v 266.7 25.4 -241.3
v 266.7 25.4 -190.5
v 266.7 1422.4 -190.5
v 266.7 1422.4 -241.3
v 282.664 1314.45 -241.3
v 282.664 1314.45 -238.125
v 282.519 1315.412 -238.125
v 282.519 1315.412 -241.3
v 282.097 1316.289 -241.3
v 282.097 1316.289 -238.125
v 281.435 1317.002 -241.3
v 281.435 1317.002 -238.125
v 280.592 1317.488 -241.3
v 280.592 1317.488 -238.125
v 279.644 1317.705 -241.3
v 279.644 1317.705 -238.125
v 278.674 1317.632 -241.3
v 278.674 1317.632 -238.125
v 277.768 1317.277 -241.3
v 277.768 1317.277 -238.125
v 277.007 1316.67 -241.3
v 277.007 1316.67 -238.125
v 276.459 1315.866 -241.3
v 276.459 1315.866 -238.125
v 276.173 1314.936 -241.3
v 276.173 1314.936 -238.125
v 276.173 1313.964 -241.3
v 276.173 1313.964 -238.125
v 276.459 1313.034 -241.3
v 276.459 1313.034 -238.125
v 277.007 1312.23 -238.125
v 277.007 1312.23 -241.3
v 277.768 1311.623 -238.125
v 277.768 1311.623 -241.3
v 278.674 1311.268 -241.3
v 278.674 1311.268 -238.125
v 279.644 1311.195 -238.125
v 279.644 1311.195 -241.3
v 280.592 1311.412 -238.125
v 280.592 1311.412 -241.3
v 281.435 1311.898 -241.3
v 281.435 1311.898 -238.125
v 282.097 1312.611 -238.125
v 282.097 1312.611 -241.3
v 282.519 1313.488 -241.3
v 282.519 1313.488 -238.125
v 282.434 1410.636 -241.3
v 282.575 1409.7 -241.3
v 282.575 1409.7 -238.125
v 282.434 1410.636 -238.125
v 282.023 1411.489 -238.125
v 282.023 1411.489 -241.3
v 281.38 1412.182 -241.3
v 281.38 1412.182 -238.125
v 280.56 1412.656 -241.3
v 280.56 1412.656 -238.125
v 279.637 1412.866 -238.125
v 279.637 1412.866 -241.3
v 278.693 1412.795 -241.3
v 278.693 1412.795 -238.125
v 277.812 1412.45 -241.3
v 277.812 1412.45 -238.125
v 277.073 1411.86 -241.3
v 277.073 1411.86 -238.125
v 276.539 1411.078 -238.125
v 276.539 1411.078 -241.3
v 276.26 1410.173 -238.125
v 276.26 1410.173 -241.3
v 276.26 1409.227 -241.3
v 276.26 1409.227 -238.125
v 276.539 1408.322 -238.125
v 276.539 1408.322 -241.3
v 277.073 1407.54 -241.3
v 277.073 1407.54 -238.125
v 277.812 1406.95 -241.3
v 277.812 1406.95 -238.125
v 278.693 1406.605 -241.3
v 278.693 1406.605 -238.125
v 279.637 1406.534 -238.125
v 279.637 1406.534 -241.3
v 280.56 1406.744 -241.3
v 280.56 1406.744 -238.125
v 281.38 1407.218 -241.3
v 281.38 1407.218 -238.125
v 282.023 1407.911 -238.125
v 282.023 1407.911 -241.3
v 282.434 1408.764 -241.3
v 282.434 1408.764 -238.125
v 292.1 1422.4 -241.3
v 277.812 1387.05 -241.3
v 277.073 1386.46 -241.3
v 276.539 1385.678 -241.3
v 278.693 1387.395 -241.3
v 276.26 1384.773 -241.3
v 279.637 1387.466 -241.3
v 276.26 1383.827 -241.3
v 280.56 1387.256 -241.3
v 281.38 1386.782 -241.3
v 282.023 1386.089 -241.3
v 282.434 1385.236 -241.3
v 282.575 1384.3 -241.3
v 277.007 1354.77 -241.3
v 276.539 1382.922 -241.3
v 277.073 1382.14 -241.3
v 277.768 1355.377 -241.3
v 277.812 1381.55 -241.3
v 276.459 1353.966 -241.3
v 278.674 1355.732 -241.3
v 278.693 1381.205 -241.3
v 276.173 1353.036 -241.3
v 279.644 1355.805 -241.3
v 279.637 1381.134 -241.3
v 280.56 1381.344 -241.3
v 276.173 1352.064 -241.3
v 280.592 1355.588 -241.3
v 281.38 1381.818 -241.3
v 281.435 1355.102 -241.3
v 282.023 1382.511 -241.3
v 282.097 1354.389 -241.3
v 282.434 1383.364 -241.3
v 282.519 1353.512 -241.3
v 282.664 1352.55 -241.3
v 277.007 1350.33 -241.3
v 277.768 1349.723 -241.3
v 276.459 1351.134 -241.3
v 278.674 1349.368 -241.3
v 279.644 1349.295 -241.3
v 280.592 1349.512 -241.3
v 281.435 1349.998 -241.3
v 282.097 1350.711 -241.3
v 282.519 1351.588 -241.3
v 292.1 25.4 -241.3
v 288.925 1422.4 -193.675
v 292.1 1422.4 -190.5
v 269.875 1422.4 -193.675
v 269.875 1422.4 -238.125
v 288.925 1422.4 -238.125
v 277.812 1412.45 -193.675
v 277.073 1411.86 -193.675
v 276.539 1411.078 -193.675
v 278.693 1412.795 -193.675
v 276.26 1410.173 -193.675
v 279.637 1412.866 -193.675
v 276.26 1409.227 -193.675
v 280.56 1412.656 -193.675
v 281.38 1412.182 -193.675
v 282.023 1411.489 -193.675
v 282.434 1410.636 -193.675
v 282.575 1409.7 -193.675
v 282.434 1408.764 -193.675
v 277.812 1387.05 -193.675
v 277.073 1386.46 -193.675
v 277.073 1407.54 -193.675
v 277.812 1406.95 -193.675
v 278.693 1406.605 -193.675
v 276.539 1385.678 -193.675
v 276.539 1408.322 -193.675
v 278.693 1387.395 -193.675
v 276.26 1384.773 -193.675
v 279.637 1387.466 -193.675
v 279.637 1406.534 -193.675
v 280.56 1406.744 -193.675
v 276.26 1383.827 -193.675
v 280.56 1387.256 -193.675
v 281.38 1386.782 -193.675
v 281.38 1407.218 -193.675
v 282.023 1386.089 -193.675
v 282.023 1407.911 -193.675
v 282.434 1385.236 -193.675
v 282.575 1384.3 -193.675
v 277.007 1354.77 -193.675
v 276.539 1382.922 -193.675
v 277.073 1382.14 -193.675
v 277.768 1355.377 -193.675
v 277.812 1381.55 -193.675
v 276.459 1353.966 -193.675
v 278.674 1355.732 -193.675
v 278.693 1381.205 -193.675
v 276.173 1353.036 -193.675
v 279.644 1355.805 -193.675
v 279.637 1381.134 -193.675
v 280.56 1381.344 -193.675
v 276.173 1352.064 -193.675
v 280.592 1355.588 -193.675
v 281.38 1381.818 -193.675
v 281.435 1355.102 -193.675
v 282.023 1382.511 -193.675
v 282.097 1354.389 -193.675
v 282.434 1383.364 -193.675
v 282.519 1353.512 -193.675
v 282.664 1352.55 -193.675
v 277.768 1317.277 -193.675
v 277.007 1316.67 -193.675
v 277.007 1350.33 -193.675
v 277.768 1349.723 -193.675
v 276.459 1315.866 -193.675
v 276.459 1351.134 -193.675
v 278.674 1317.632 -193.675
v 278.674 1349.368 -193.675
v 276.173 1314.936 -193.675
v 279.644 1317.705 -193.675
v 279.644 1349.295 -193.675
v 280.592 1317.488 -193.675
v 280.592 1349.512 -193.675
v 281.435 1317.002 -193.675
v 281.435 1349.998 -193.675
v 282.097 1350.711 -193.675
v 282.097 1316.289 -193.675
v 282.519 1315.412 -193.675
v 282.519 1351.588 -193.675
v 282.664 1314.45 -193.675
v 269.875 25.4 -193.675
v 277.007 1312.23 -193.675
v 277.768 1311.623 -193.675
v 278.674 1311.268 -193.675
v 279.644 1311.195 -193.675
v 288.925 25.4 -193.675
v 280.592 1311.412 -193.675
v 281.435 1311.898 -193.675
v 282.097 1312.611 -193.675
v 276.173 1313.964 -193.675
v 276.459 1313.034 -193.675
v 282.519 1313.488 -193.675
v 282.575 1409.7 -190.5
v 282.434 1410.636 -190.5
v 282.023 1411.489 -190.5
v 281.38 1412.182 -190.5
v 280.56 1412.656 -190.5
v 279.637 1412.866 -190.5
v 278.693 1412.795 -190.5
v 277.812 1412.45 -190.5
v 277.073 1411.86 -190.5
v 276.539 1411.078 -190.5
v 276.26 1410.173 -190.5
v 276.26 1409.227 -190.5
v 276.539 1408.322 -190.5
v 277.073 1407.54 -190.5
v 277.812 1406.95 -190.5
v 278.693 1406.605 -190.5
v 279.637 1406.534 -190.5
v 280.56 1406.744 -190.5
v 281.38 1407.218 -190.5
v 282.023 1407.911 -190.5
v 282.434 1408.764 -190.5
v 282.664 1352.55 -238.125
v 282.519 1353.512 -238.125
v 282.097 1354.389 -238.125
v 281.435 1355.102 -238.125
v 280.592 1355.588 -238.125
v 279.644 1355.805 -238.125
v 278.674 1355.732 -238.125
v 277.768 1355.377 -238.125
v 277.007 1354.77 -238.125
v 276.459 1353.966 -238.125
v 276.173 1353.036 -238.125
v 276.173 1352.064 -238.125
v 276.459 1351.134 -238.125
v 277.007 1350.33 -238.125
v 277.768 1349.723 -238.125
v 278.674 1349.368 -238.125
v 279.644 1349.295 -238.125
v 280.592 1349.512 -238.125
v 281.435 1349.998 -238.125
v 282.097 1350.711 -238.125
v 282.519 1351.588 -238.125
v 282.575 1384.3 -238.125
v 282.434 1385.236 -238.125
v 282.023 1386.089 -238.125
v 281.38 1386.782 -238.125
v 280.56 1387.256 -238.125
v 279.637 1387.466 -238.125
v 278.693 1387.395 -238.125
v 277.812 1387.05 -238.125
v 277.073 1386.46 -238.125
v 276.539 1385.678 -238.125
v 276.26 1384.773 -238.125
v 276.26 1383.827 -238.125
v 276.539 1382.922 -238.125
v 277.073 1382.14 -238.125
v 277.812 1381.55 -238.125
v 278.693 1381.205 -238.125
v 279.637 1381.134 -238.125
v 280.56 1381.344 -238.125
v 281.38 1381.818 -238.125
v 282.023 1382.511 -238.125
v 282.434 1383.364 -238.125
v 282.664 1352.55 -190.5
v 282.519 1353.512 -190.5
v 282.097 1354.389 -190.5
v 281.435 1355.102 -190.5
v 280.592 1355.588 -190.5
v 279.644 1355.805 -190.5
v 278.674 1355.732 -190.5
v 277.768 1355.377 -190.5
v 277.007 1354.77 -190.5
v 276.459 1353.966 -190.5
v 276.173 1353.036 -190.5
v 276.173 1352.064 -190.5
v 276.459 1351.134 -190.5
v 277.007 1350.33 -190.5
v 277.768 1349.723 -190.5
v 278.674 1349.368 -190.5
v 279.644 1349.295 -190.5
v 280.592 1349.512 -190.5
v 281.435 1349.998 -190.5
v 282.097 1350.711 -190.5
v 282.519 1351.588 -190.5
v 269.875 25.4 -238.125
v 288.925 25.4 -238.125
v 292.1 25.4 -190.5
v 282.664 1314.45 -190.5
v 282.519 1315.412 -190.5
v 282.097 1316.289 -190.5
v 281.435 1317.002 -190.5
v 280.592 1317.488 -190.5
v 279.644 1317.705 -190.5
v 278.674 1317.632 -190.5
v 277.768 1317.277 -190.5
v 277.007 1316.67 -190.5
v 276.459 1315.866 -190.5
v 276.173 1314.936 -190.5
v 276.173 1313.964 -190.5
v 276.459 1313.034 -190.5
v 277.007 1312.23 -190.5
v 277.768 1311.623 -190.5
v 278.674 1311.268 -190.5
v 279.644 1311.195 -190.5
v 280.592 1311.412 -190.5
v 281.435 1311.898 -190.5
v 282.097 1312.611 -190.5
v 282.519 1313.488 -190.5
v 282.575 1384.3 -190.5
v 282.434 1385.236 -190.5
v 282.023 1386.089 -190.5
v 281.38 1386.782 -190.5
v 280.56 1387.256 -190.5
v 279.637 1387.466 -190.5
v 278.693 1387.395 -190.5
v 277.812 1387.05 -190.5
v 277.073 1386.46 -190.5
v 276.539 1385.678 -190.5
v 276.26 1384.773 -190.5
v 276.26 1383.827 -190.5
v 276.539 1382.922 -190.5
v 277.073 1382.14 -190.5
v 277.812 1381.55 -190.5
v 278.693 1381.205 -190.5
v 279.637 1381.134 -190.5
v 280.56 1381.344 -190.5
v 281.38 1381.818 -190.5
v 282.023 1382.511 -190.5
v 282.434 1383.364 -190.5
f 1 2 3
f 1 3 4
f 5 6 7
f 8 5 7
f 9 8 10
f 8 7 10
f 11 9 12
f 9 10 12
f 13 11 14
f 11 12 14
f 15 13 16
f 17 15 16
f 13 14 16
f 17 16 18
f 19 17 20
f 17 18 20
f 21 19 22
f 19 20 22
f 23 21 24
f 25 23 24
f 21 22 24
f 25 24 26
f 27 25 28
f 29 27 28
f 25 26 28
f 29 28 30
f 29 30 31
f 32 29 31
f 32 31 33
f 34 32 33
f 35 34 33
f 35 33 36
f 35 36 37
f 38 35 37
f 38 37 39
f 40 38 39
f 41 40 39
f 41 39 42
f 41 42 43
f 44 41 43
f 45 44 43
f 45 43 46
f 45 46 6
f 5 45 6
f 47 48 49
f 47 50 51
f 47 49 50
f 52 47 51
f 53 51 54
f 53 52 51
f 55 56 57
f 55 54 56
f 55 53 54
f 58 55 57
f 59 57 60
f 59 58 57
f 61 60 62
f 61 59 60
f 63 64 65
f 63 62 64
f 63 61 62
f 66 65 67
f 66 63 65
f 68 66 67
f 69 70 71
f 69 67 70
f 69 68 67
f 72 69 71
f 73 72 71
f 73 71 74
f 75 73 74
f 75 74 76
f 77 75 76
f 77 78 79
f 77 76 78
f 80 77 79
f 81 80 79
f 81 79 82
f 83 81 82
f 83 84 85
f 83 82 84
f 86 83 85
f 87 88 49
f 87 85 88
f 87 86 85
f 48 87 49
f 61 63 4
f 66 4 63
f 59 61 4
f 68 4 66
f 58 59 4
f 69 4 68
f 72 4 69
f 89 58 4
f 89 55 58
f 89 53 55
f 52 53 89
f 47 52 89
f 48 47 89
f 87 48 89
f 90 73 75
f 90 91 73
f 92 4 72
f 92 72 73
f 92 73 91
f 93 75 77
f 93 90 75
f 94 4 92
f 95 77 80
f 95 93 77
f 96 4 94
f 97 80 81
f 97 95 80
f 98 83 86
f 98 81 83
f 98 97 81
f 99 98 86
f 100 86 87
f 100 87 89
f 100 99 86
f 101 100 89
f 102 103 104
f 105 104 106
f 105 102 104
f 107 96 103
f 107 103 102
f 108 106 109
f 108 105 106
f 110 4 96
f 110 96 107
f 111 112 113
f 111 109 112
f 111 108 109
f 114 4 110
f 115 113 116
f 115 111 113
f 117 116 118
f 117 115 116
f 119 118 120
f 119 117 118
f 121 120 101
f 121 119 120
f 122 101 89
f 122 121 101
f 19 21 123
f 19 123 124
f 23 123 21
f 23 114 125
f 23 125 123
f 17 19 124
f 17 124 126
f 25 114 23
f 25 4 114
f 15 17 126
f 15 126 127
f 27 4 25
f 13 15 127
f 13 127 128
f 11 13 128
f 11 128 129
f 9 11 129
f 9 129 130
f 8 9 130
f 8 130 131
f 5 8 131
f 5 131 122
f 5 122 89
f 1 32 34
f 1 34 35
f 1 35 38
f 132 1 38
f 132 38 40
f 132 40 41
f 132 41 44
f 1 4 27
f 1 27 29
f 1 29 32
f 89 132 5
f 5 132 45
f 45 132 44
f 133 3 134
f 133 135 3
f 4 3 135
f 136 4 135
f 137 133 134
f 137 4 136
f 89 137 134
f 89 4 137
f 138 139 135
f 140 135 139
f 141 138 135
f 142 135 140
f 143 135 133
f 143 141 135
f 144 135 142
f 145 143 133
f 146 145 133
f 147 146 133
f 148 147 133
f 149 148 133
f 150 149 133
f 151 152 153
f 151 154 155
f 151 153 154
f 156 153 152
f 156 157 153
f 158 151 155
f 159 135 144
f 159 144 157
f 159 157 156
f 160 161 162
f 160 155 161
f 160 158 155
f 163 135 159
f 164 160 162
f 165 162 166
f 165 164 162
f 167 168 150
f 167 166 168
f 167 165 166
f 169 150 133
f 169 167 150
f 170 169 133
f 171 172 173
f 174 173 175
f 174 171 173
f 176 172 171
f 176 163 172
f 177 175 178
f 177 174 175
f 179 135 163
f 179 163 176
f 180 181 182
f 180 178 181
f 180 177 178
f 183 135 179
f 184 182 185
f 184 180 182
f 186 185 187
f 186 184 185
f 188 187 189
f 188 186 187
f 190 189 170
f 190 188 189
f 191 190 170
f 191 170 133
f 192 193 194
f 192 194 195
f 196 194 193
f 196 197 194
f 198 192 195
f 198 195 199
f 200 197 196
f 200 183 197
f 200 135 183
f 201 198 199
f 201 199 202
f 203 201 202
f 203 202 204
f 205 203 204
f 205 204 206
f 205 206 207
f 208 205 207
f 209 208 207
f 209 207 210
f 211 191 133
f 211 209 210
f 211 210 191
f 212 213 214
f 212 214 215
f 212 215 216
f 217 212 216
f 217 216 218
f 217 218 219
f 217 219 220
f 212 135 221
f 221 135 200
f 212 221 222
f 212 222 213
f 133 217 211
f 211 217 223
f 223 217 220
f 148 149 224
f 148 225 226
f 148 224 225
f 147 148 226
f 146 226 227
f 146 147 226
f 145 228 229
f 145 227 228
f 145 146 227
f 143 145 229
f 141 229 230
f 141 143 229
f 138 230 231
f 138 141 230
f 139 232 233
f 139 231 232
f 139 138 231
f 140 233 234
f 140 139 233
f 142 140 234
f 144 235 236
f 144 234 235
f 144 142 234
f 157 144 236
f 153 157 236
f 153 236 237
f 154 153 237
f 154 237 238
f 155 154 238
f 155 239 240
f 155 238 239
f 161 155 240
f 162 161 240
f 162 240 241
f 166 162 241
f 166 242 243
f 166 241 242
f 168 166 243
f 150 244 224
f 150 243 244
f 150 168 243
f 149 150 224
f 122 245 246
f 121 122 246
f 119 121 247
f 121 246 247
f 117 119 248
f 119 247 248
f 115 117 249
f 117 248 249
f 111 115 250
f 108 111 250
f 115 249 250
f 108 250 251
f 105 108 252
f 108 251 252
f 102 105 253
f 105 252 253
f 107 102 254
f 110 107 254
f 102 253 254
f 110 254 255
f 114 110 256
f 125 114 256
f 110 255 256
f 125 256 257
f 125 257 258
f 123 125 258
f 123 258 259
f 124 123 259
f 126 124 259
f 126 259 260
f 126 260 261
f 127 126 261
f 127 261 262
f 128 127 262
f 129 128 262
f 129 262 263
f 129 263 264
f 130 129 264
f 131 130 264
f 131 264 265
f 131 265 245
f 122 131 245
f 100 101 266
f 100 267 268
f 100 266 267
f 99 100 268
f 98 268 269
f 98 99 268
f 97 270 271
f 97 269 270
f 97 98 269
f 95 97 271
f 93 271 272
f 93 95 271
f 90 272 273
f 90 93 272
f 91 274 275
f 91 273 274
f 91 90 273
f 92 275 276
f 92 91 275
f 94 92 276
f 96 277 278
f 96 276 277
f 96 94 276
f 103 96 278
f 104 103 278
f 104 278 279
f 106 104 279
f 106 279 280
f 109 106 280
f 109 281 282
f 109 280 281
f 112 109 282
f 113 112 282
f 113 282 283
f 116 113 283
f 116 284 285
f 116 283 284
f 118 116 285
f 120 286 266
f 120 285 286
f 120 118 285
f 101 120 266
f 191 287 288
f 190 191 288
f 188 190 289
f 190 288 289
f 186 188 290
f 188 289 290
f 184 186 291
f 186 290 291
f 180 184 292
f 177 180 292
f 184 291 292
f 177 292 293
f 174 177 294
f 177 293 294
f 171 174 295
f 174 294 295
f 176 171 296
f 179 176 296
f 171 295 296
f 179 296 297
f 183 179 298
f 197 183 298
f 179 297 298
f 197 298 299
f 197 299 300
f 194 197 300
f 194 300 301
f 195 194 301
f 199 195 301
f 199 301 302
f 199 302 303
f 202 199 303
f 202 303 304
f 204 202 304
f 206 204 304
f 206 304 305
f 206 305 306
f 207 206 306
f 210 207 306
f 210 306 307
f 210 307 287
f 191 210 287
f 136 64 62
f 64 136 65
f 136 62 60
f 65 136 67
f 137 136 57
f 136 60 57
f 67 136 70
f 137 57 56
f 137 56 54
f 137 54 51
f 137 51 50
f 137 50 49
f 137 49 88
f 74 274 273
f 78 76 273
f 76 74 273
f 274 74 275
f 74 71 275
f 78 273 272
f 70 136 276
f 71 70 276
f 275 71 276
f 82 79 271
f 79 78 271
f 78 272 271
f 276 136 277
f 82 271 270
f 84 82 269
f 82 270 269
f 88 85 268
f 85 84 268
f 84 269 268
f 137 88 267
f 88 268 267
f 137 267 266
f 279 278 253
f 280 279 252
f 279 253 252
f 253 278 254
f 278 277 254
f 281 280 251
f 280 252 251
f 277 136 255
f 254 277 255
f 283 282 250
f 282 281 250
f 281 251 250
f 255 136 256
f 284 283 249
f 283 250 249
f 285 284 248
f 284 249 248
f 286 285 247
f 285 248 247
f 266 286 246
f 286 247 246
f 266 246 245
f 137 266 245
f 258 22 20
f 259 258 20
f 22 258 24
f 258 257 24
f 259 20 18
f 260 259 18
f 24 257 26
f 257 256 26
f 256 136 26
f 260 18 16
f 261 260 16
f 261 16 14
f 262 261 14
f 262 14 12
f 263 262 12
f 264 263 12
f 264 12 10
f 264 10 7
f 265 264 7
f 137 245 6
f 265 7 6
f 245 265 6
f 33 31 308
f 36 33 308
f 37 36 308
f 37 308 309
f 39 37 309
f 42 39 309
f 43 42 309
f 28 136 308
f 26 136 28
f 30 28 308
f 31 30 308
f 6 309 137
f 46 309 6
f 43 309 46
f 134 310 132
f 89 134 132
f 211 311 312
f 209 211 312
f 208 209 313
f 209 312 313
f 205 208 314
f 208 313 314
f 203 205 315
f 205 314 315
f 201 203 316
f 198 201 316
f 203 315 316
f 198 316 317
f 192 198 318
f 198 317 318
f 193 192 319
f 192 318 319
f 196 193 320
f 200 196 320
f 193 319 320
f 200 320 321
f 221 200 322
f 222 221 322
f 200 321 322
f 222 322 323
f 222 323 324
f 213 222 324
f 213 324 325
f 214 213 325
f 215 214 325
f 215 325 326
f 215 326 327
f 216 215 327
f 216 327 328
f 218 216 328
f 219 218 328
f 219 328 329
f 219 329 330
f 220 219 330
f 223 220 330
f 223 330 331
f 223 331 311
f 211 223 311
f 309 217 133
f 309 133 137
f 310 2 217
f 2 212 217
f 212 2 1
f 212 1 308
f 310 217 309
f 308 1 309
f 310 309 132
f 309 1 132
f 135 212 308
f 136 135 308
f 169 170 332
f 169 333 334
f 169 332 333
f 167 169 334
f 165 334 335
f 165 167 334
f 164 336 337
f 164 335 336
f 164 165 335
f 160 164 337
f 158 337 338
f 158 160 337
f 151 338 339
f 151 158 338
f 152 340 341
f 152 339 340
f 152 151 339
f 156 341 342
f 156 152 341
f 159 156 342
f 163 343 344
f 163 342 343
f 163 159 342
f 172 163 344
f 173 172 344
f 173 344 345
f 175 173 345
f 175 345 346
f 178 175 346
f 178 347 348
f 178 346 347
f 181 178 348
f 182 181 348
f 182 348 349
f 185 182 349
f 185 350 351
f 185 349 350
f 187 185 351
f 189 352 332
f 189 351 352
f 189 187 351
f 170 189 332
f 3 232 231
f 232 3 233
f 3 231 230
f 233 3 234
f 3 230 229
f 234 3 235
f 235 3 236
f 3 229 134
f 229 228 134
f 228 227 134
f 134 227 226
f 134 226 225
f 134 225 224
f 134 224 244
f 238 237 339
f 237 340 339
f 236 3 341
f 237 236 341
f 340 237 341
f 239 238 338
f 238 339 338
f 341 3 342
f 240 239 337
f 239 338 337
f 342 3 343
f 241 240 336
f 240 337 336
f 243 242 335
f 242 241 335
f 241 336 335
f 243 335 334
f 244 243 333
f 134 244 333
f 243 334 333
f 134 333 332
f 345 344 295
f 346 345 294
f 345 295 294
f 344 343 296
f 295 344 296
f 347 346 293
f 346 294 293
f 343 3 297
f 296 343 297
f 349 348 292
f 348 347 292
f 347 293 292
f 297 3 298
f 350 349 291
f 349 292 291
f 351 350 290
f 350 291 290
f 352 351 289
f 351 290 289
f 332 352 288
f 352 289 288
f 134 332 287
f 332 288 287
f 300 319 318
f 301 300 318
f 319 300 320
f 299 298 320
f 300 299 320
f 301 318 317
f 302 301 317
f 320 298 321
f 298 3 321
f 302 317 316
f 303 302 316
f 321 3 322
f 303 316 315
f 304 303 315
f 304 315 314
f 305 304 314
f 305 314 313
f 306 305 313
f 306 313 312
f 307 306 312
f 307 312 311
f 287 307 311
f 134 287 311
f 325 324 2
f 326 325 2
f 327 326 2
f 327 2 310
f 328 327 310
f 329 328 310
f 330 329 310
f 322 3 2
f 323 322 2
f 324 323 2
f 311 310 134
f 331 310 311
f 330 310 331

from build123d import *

# Parameters (mm, degrees)
SKETCH1_W               = 25.4
SKETCH1_H               = 50.8
SKETCH1_W_2             = 19.05
SKETCH1_H_2             = 44.45
BOSS_EXTRUDE1_DEPTH     = 1397
SKETCH2_R               = 3.2639
CUT_EXTRUDE1_DEPTH      = 1472.995197003
CUT_EXTRUDE2_DEPTH      = 1472.995197003
CUT_EXTRUDE2_DEPTH_BACK = 1472.995197003
SKETCH3_R               = 3.175


with BuildPart() as part:
    # Sketch1 → Boss-Extrude1 (new body)
    with BuildSketch(Plane(origin=(0, 25.4, 0), x_dir=(1, 0, 0), z_dir=(0, 1, 0))):
        with Locations((279.4, 215.9)):
            Rectangle(SKETCH1_W, SKETCH1_H)
        with Locations((279.4, 215.9)):
            Rectangle(SKETCH1_W_2, SKETCH1_H_2, mode=Mode.SUBTRACT)
    extrude(amount=BOSS_EXTRUDE1_DEPTH)

    # Sketch2 → Cut-Extrude1 (cut, through all)
    with BuildSketch(Plane.XY):
        with Locations((279.4, 1314.45)):
            Circle(SKETCH2_R)
        with Locations((279.4, 1352.55)):
            Circle(SKETCH2_R)
    extrude(amount=-CUT_EXTRUDE1_DEPTH, mode=Mode.SUBTRACT)

    # Sketch3 → Cut-Extrude2 (cut, two sides: drawn at the far end of the back side and taken through both)
    with BuildSketch(Plane.XY.offset(-CUT_EXTRUDE2_DEPTH_BACK)):
        with Locations((279.4, 1384.3)):
            Circle(SKETCH3_R)
        with Locations((279.4, 1409.7)):
            Circle(SKETCH3_R)
    extrude(amount=CUT_EXTRUDE2_DEPTH + CUT_EXTRUDE2_DEPTH_BACK, mode=Mode.SUBTRACT)


solid = part.part
